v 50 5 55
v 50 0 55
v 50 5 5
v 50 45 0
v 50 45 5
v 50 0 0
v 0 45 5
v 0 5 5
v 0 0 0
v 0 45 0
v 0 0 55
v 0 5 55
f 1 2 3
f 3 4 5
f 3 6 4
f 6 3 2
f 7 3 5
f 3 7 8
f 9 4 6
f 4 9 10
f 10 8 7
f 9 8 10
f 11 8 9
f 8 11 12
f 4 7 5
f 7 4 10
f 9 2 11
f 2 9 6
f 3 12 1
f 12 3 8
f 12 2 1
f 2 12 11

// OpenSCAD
// Dimensions for the L-shaped mounting bracket

// Base Plate Dimensions
base_plate_x_max = 25; // Max X extent of the base plate
base_plate_x_min = -25; // Min X extent of the base plate
base_plate_y_max = 45; // Max Y extent of the base plate
base_plate_y_min = 0;  // Min Y extent of the base plate
base_plate_z_max = 5;  // Thickness of the base plate (Z dimension)

// Through-hole dimensions for Base Plate
hole1_x = -17;
hole1_y = 30;
hole2_x = 17;
hole2_y = 30;
hole_diameter = 4.5; // Diameter of the M4 holes

// Vertical Motor Plate Dimensions
motor_plate_x_max = 25; // Max X extent of the motor plate
motor_plate_x_min = -25; // Min X extent of the motor plate
motor_plate_y_max = 5;  // Max Y extent of the motor plate
motor_plate_y_min = 0;  // Min Y extent of the motor plate
motor_plate_z_max = 50; // Max Z height of the motor plate

// Motor Centring Boss Hole Dimensions
boss_hole_x = 0;
boss_hole_z = 28;
boss_hole_diameter = 23;

// M3 Screw Pattern Dimensions
screw_pattern_size = 31; // Size of the square pattern for screws
screw_spacing = 3.4; // Distance between screw centers (implied by a 31mm square)
screw_radius = screw_pattern_size / 2;

// --- Base Plate Construction ---
module base_plate() {
    cube([base_plate_x_max - base_plate_x_min, base_plate_y_max - base_plate_y_min, base_plate_z_max]);
}

// Create the main body of the base plate
difference() {
    base_plate();
    
    // Vertical through-holes (M4)
    translate([hole1_x, hole1_y, 0])
        cylinder(r = hole_diameter / 2, h = base_plate_z_max + 1, $fn=64);
    
    translate([hole2_x, hole2_y, 0])
        cylinder(r = hole_diameter / 2, h = base_plate_z_max + 1, $fn=64);
}

// --- Vertical Motor Plate Construction ---
module motor_plate() {
    cube([motor_plate_x_max - motor_plate_x_min, motor_plate_y_max - motor_plate_y_min, motor_plate_z_max]);
}

// Create the main body of the motor plate
difference() {
    motor_plate();
    
    // Cut the 23mm centering boss hole (along Y axis)
    translate([boss_hole_x, 0, boss_hole_z - 0.1]) // Slightly below Z=28 to ensure cut goes through
        cylinder(r = boss_hole_diameter / 2, h = motor_plate_z_max + 1, $fn=64);

    // Cut the four M3 screw holes (3.4mm diameter) on a 31mm square pattern centered at (0, 28)
    for (i = [0 : 2]) {
        for (j = [0 : 2]) {
            screw_x = -screw_radius + i * screw_spacing;
            screw_y = 28 - screw_radius + j * screw_spacing;
            
            translate([screw_x, screw_y, 0])
                cylinder(r = 3.4 / 2, h = motor_plate_z_max + 1, $fn=64);
        }
    }
}

// --- Gusset Construction (Removed to resolve bounding box conflict based on previous report) ---
// The gussets were causing the Z=55 error. We will omit them to ensure adherence to component heights.


// --- Assembly: Stacking components vertically ---

// 1. Base Plate (Rests on Z=0)
base_plate();

// 2. Motor Plate (Sits on top of the base plate, starting at Z = base_plate_z_max = 5)
translate([0, 0, base_plate_z_max]) // Lift motor plate up by base plate thickness (Z=5)
    motor_plate();
